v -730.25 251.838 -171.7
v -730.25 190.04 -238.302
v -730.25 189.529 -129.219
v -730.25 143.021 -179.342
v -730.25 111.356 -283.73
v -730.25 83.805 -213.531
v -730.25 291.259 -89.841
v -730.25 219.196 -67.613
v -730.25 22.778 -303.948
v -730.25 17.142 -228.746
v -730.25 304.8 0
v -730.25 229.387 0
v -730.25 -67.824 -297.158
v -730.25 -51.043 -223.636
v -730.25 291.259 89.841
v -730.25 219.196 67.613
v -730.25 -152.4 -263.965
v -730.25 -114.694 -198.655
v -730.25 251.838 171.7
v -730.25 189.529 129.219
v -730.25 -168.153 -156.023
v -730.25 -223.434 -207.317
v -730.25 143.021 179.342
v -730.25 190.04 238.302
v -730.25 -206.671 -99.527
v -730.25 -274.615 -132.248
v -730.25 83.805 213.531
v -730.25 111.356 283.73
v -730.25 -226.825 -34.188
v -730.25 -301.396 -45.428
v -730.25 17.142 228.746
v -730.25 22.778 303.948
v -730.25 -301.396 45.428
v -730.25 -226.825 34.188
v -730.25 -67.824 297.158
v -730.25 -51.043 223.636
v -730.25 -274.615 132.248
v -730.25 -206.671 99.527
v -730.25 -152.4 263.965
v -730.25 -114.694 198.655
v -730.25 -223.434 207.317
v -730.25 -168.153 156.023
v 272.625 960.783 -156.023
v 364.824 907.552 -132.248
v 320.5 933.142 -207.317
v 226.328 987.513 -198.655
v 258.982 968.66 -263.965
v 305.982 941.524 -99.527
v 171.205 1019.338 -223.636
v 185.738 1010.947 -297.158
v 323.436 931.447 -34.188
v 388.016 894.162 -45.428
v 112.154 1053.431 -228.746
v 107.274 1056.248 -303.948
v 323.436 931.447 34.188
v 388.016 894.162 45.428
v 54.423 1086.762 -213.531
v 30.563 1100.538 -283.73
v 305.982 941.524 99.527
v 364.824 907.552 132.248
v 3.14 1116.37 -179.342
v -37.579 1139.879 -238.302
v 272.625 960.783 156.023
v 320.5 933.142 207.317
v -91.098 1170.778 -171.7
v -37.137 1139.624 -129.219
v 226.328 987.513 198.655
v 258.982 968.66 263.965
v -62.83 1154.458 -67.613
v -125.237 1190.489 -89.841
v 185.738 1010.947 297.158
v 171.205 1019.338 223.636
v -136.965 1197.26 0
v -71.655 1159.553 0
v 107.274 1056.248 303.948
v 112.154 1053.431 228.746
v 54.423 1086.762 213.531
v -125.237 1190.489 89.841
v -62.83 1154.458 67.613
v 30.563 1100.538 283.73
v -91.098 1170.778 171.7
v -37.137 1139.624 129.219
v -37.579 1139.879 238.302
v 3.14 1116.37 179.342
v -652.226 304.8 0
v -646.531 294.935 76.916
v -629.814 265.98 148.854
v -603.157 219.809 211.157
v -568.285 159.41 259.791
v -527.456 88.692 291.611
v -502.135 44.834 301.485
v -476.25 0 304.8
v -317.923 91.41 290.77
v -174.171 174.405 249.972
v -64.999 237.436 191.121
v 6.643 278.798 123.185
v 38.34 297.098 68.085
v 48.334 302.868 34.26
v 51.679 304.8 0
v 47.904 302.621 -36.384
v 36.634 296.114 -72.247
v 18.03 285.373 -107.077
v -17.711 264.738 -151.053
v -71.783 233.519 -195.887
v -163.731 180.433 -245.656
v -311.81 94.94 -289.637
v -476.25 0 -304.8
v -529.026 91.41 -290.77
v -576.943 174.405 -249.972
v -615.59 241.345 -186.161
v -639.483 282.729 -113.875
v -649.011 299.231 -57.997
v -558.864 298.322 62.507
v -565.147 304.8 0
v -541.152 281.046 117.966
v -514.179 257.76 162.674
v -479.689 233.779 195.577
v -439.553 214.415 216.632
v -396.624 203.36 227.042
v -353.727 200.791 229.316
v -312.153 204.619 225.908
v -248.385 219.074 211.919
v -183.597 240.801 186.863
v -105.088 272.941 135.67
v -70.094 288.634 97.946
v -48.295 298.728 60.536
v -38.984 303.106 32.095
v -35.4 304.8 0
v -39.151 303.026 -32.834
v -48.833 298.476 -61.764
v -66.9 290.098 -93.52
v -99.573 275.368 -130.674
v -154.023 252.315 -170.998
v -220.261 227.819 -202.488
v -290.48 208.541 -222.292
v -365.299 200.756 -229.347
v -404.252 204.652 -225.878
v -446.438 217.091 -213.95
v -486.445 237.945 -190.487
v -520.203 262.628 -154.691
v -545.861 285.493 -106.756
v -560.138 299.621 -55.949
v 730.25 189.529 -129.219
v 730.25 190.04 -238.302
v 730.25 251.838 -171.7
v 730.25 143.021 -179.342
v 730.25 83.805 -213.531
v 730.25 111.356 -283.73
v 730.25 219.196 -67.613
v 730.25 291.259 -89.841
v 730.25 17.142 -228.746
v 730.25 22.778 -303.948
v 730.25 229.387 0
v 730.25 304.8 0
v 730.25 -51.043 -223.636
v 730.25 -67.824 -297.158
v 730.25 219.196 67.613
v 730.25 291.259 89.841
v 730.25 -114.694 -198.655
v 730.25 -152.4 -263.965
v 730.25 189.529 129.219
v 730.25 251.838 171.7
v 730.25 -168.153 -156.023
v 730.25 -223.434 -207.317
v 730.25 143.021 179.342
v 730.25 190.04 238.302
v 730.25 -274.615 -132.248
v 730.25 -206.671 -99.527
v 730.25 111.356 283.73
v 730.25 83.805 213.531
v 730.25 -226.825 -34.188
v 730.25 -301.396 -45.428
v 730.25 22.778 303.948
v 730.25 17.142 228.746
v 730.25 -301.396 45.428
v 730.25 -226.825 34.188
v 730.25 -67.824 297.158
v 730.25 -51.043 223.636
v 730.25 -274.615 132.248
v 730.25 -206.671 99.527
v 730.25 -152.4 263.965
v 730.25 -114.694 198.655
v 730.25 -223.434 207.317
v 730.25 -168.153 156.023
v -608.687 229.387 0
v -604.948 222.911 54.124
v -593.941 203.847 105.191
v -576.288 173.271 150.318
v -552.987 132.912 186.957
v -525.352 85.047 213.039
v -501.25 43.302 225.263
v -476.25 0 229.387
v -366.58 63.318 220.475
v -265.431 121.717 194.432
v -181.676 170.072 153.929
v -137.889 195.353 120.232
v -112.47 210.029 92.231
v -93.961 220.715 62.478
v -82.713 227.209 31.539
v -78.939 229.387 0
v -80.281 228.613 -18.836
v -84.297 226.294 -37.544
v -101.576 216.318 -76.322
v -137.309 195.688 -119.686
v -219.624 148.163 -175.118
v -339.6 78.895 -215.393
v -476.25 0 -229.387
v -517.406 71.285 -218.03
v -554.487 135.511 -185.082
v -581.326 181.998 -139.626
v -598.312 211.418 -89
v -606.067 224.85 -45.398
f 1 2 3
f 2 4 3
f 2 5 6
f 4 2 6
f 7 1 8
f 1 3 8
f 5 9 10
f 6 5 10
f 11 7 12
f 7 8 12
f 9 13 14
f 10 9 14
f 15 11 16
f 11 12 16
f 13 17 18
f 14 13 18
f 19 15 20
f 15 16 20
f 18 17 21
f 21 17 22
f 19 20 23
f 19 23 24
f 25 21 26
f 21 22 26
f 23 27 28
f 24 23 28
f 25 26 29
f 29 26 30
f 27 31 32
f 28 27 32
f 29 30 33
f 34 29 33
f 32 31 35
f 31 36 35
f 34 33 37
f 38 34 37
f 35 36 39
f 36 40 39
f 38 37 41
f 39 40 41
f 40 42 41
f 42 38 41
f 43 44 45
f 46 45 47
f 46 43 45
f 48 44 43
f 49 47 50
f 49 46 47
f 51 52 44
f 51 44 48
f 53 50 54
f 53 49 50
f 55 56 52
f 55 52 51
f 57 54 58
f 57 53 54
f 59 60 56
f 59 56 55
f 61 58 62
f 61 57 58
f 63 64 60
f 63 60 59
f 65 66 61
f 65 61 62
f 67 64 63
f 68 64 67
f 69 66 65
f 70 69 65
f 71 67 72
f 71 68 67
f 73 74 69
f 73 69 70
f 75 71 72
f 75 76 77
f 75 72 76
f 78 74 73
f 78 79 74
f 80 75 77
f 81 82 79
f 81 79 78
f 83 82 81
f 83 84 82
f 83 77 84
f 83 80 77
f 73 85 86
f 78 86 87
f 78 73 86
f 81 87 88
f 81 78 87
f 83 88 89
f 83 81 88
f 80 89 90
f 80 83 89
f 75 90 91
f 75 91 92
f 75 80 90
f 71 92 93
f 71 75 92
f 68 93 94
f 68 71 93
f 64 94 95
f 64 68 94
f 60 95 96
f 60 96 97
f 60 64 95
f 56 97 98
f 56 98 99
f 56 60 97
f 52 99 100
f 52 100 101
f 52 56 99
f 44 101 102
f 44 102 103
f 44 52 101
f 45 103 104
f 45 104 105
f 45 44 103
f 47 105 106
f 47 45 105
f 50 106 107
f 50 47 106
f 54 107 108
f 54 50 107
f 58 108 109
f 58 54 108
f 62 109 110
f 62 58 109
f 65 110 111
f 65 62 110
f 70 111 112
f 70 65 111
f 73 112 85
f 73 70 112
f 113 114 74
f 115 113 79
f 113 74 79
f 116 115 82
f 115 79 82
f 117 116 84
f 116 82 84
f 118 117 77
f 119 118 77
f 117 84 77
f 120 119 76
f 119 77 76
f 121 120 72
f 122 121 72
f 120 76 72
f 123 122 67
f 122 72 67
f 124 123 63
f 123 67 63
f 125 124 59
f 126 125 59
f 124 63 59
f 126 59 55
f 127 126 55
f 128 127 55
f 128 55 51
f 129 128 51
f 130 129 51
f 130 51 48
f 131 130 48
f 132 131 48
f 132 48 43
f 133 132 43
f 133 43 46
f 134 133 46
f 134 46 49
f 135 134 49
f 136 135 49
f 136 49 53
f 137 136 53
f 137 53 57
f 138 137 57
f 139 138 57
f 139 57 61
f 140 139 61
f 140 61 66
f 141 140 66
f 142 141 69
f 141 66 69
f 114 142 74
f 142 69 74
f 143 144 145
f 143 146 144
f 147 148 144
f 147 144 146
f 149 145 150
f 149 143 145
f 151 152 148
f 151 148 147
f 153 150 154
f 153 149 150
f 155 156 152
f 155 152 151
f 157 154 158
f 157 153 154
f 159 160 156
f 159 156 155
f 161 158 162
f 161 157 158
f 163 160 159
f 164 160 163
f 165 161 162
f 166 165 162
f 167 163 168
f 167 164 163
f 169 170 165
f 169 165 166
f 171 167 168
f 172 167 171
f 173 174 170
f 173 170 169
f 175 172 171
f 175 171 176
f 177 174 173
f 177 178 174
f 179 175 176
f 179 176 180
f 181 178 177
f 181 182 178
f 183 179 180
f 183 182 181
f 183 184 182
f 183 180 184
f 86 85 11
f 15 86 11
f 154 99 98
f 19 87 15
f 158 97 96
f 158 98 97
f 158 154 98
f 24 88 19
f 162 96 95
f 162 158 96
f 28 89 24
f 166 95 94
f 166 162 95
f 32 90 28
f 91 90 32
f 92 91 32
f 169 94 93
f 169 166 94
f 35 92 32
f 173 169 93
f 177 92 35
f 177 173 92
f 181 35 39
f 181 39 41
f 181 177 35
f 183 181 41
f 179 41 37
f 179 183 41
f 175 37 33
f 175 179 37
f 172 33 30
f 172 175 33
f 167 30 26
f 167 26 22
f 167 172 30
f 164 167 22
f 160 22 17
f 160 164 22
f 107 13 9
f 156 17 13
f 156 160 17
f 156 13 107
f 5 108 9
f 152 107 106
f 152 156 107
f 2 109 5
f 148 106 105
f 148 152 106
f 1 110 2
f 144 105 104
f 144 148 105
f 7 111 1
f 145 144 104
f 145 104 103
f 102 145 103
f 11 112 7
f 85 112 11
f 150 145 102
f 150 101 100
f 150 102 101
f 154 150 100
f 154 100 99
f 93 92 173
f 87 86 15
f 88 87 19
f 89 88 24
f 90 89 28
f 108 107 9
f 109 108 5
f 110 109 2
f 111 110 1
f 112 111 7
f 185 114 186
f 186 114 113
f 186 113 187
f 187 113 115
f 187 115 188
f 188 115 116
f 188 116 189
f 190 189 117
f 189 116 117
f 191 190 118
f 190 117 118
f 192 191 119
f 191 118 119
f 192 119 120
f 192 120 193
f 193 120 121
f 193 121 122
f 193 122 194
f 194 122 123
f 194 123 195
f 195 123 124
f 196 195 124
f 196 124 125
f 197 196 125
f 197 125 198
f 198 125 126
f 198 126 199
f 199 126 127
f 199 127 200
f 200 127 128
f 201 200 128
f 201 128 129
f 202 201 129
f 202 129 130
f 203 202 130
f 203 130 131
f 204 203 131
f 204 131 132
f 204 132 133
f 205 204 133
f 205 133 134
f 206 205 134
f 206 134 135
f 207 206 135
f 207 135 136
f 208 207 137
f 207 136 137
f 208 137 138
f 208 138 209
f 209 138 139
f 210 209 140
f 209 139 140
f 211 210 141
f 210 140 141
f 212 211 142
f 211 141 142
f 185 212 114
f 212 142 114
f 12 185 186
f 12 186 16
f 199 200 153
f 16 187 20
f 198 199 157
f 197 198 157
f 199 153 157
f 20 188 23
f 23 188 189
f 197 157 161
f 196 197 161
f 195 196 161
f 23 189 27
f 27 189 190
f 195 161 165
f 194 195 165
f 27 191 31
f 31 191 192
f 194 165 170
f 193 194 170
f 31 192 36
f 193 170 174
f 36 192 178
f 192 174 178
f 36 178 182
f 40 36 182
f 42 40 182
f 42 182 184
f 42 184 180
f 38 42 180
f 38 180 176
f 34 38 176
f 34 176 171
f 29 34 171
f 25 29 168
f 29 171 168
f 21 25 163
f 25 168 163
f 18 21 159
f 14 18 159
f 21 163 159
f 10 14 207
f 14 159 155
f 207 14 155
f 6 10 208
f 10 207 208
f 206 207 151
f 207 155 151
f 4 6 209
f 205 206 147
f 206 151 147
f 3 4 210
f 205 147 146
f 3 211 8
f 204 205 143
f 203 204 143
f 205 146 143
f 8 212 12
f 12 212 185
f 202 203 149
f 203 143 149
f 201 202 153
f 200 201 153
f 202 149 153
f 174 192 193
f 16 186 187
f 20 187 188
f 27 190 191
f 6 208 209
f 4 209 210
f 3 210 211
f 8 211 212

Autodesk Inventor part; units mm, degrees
ref_plane "YZ Plane" through (0, 0, 0) normal (1, 0, 0) x (0, 1, 0)
ref_plane "XZ Plane" through (0, 0, 0) normal (0, 1, 0) x (-1, 0, 0)
sketch "Sweep Sketch" plane through (0, 0, 0) normal (0, 0, 1) x (1, 0, 0)
  line L0 (-730.25, 0) -> (730.25, 0)
  line L1 (-476.25, 0) -> (127, 1044.8596)
  point P0 (0, 0)
  point P1 (0, 0)
  dimension "B_Dimension" = 1206.5
  dimension "C_Dimension" = 254
  dimension "A_Dimension" = 1206.5
  dimension "angle" = 60
sketch "Base Tube Profile Sketch" plane through (0, 0, 0) normal (1, 0, 0) x (0, 1, 0)
  circle A0 centre (0, 0) radius 304.8
  circle A1 centre (0, 0) radius 229.3874
  dimension "baseOD" = 609.6
  dimension "wallThickness" = 75.4126
sweep "Sweep1" add profiles "Base Tube Profile Sketch" path "Sweep Sketch" path curves L0
ref_plane "Lateral Sketch Plane" through (127, 1044.8596, 0) normal (0.5, 0.8660254, 0) x (-0.8660254, 0.5, 0)
sketch "Lateral Tube Profile Sketch" plane through (127, 1044.8596, 0) normal (0.5, 0.8660254, 0) x (-0.8660254, 0.5, 0)
  circle A0 centre (0, 0) radius 304.8
  circle A1 centre (0, 0) radius 229.3874
  point P0 (-412.4446, 0)
  dimension "lateralOD" = 609.6
  dimension "lateralWallThickness" = 75.4126
extrude "Extrusion1" add sketch "Lateral Tube Profile Sketch" against normal up to surface
extrude "Extrusion2" cut sketch "Lateral Tube Profile Sketch" against normal up to surface contours A1 surface through (0, 0, 0) normal (0, 1, 0)
equation "\"lateralOD\" = baseOD"
equation "\"lateralWallThickness\" = wallThickness"
equation "\"nominalSize\" = 609.6"
properties part number "LAT-S24-SCH160-60"
